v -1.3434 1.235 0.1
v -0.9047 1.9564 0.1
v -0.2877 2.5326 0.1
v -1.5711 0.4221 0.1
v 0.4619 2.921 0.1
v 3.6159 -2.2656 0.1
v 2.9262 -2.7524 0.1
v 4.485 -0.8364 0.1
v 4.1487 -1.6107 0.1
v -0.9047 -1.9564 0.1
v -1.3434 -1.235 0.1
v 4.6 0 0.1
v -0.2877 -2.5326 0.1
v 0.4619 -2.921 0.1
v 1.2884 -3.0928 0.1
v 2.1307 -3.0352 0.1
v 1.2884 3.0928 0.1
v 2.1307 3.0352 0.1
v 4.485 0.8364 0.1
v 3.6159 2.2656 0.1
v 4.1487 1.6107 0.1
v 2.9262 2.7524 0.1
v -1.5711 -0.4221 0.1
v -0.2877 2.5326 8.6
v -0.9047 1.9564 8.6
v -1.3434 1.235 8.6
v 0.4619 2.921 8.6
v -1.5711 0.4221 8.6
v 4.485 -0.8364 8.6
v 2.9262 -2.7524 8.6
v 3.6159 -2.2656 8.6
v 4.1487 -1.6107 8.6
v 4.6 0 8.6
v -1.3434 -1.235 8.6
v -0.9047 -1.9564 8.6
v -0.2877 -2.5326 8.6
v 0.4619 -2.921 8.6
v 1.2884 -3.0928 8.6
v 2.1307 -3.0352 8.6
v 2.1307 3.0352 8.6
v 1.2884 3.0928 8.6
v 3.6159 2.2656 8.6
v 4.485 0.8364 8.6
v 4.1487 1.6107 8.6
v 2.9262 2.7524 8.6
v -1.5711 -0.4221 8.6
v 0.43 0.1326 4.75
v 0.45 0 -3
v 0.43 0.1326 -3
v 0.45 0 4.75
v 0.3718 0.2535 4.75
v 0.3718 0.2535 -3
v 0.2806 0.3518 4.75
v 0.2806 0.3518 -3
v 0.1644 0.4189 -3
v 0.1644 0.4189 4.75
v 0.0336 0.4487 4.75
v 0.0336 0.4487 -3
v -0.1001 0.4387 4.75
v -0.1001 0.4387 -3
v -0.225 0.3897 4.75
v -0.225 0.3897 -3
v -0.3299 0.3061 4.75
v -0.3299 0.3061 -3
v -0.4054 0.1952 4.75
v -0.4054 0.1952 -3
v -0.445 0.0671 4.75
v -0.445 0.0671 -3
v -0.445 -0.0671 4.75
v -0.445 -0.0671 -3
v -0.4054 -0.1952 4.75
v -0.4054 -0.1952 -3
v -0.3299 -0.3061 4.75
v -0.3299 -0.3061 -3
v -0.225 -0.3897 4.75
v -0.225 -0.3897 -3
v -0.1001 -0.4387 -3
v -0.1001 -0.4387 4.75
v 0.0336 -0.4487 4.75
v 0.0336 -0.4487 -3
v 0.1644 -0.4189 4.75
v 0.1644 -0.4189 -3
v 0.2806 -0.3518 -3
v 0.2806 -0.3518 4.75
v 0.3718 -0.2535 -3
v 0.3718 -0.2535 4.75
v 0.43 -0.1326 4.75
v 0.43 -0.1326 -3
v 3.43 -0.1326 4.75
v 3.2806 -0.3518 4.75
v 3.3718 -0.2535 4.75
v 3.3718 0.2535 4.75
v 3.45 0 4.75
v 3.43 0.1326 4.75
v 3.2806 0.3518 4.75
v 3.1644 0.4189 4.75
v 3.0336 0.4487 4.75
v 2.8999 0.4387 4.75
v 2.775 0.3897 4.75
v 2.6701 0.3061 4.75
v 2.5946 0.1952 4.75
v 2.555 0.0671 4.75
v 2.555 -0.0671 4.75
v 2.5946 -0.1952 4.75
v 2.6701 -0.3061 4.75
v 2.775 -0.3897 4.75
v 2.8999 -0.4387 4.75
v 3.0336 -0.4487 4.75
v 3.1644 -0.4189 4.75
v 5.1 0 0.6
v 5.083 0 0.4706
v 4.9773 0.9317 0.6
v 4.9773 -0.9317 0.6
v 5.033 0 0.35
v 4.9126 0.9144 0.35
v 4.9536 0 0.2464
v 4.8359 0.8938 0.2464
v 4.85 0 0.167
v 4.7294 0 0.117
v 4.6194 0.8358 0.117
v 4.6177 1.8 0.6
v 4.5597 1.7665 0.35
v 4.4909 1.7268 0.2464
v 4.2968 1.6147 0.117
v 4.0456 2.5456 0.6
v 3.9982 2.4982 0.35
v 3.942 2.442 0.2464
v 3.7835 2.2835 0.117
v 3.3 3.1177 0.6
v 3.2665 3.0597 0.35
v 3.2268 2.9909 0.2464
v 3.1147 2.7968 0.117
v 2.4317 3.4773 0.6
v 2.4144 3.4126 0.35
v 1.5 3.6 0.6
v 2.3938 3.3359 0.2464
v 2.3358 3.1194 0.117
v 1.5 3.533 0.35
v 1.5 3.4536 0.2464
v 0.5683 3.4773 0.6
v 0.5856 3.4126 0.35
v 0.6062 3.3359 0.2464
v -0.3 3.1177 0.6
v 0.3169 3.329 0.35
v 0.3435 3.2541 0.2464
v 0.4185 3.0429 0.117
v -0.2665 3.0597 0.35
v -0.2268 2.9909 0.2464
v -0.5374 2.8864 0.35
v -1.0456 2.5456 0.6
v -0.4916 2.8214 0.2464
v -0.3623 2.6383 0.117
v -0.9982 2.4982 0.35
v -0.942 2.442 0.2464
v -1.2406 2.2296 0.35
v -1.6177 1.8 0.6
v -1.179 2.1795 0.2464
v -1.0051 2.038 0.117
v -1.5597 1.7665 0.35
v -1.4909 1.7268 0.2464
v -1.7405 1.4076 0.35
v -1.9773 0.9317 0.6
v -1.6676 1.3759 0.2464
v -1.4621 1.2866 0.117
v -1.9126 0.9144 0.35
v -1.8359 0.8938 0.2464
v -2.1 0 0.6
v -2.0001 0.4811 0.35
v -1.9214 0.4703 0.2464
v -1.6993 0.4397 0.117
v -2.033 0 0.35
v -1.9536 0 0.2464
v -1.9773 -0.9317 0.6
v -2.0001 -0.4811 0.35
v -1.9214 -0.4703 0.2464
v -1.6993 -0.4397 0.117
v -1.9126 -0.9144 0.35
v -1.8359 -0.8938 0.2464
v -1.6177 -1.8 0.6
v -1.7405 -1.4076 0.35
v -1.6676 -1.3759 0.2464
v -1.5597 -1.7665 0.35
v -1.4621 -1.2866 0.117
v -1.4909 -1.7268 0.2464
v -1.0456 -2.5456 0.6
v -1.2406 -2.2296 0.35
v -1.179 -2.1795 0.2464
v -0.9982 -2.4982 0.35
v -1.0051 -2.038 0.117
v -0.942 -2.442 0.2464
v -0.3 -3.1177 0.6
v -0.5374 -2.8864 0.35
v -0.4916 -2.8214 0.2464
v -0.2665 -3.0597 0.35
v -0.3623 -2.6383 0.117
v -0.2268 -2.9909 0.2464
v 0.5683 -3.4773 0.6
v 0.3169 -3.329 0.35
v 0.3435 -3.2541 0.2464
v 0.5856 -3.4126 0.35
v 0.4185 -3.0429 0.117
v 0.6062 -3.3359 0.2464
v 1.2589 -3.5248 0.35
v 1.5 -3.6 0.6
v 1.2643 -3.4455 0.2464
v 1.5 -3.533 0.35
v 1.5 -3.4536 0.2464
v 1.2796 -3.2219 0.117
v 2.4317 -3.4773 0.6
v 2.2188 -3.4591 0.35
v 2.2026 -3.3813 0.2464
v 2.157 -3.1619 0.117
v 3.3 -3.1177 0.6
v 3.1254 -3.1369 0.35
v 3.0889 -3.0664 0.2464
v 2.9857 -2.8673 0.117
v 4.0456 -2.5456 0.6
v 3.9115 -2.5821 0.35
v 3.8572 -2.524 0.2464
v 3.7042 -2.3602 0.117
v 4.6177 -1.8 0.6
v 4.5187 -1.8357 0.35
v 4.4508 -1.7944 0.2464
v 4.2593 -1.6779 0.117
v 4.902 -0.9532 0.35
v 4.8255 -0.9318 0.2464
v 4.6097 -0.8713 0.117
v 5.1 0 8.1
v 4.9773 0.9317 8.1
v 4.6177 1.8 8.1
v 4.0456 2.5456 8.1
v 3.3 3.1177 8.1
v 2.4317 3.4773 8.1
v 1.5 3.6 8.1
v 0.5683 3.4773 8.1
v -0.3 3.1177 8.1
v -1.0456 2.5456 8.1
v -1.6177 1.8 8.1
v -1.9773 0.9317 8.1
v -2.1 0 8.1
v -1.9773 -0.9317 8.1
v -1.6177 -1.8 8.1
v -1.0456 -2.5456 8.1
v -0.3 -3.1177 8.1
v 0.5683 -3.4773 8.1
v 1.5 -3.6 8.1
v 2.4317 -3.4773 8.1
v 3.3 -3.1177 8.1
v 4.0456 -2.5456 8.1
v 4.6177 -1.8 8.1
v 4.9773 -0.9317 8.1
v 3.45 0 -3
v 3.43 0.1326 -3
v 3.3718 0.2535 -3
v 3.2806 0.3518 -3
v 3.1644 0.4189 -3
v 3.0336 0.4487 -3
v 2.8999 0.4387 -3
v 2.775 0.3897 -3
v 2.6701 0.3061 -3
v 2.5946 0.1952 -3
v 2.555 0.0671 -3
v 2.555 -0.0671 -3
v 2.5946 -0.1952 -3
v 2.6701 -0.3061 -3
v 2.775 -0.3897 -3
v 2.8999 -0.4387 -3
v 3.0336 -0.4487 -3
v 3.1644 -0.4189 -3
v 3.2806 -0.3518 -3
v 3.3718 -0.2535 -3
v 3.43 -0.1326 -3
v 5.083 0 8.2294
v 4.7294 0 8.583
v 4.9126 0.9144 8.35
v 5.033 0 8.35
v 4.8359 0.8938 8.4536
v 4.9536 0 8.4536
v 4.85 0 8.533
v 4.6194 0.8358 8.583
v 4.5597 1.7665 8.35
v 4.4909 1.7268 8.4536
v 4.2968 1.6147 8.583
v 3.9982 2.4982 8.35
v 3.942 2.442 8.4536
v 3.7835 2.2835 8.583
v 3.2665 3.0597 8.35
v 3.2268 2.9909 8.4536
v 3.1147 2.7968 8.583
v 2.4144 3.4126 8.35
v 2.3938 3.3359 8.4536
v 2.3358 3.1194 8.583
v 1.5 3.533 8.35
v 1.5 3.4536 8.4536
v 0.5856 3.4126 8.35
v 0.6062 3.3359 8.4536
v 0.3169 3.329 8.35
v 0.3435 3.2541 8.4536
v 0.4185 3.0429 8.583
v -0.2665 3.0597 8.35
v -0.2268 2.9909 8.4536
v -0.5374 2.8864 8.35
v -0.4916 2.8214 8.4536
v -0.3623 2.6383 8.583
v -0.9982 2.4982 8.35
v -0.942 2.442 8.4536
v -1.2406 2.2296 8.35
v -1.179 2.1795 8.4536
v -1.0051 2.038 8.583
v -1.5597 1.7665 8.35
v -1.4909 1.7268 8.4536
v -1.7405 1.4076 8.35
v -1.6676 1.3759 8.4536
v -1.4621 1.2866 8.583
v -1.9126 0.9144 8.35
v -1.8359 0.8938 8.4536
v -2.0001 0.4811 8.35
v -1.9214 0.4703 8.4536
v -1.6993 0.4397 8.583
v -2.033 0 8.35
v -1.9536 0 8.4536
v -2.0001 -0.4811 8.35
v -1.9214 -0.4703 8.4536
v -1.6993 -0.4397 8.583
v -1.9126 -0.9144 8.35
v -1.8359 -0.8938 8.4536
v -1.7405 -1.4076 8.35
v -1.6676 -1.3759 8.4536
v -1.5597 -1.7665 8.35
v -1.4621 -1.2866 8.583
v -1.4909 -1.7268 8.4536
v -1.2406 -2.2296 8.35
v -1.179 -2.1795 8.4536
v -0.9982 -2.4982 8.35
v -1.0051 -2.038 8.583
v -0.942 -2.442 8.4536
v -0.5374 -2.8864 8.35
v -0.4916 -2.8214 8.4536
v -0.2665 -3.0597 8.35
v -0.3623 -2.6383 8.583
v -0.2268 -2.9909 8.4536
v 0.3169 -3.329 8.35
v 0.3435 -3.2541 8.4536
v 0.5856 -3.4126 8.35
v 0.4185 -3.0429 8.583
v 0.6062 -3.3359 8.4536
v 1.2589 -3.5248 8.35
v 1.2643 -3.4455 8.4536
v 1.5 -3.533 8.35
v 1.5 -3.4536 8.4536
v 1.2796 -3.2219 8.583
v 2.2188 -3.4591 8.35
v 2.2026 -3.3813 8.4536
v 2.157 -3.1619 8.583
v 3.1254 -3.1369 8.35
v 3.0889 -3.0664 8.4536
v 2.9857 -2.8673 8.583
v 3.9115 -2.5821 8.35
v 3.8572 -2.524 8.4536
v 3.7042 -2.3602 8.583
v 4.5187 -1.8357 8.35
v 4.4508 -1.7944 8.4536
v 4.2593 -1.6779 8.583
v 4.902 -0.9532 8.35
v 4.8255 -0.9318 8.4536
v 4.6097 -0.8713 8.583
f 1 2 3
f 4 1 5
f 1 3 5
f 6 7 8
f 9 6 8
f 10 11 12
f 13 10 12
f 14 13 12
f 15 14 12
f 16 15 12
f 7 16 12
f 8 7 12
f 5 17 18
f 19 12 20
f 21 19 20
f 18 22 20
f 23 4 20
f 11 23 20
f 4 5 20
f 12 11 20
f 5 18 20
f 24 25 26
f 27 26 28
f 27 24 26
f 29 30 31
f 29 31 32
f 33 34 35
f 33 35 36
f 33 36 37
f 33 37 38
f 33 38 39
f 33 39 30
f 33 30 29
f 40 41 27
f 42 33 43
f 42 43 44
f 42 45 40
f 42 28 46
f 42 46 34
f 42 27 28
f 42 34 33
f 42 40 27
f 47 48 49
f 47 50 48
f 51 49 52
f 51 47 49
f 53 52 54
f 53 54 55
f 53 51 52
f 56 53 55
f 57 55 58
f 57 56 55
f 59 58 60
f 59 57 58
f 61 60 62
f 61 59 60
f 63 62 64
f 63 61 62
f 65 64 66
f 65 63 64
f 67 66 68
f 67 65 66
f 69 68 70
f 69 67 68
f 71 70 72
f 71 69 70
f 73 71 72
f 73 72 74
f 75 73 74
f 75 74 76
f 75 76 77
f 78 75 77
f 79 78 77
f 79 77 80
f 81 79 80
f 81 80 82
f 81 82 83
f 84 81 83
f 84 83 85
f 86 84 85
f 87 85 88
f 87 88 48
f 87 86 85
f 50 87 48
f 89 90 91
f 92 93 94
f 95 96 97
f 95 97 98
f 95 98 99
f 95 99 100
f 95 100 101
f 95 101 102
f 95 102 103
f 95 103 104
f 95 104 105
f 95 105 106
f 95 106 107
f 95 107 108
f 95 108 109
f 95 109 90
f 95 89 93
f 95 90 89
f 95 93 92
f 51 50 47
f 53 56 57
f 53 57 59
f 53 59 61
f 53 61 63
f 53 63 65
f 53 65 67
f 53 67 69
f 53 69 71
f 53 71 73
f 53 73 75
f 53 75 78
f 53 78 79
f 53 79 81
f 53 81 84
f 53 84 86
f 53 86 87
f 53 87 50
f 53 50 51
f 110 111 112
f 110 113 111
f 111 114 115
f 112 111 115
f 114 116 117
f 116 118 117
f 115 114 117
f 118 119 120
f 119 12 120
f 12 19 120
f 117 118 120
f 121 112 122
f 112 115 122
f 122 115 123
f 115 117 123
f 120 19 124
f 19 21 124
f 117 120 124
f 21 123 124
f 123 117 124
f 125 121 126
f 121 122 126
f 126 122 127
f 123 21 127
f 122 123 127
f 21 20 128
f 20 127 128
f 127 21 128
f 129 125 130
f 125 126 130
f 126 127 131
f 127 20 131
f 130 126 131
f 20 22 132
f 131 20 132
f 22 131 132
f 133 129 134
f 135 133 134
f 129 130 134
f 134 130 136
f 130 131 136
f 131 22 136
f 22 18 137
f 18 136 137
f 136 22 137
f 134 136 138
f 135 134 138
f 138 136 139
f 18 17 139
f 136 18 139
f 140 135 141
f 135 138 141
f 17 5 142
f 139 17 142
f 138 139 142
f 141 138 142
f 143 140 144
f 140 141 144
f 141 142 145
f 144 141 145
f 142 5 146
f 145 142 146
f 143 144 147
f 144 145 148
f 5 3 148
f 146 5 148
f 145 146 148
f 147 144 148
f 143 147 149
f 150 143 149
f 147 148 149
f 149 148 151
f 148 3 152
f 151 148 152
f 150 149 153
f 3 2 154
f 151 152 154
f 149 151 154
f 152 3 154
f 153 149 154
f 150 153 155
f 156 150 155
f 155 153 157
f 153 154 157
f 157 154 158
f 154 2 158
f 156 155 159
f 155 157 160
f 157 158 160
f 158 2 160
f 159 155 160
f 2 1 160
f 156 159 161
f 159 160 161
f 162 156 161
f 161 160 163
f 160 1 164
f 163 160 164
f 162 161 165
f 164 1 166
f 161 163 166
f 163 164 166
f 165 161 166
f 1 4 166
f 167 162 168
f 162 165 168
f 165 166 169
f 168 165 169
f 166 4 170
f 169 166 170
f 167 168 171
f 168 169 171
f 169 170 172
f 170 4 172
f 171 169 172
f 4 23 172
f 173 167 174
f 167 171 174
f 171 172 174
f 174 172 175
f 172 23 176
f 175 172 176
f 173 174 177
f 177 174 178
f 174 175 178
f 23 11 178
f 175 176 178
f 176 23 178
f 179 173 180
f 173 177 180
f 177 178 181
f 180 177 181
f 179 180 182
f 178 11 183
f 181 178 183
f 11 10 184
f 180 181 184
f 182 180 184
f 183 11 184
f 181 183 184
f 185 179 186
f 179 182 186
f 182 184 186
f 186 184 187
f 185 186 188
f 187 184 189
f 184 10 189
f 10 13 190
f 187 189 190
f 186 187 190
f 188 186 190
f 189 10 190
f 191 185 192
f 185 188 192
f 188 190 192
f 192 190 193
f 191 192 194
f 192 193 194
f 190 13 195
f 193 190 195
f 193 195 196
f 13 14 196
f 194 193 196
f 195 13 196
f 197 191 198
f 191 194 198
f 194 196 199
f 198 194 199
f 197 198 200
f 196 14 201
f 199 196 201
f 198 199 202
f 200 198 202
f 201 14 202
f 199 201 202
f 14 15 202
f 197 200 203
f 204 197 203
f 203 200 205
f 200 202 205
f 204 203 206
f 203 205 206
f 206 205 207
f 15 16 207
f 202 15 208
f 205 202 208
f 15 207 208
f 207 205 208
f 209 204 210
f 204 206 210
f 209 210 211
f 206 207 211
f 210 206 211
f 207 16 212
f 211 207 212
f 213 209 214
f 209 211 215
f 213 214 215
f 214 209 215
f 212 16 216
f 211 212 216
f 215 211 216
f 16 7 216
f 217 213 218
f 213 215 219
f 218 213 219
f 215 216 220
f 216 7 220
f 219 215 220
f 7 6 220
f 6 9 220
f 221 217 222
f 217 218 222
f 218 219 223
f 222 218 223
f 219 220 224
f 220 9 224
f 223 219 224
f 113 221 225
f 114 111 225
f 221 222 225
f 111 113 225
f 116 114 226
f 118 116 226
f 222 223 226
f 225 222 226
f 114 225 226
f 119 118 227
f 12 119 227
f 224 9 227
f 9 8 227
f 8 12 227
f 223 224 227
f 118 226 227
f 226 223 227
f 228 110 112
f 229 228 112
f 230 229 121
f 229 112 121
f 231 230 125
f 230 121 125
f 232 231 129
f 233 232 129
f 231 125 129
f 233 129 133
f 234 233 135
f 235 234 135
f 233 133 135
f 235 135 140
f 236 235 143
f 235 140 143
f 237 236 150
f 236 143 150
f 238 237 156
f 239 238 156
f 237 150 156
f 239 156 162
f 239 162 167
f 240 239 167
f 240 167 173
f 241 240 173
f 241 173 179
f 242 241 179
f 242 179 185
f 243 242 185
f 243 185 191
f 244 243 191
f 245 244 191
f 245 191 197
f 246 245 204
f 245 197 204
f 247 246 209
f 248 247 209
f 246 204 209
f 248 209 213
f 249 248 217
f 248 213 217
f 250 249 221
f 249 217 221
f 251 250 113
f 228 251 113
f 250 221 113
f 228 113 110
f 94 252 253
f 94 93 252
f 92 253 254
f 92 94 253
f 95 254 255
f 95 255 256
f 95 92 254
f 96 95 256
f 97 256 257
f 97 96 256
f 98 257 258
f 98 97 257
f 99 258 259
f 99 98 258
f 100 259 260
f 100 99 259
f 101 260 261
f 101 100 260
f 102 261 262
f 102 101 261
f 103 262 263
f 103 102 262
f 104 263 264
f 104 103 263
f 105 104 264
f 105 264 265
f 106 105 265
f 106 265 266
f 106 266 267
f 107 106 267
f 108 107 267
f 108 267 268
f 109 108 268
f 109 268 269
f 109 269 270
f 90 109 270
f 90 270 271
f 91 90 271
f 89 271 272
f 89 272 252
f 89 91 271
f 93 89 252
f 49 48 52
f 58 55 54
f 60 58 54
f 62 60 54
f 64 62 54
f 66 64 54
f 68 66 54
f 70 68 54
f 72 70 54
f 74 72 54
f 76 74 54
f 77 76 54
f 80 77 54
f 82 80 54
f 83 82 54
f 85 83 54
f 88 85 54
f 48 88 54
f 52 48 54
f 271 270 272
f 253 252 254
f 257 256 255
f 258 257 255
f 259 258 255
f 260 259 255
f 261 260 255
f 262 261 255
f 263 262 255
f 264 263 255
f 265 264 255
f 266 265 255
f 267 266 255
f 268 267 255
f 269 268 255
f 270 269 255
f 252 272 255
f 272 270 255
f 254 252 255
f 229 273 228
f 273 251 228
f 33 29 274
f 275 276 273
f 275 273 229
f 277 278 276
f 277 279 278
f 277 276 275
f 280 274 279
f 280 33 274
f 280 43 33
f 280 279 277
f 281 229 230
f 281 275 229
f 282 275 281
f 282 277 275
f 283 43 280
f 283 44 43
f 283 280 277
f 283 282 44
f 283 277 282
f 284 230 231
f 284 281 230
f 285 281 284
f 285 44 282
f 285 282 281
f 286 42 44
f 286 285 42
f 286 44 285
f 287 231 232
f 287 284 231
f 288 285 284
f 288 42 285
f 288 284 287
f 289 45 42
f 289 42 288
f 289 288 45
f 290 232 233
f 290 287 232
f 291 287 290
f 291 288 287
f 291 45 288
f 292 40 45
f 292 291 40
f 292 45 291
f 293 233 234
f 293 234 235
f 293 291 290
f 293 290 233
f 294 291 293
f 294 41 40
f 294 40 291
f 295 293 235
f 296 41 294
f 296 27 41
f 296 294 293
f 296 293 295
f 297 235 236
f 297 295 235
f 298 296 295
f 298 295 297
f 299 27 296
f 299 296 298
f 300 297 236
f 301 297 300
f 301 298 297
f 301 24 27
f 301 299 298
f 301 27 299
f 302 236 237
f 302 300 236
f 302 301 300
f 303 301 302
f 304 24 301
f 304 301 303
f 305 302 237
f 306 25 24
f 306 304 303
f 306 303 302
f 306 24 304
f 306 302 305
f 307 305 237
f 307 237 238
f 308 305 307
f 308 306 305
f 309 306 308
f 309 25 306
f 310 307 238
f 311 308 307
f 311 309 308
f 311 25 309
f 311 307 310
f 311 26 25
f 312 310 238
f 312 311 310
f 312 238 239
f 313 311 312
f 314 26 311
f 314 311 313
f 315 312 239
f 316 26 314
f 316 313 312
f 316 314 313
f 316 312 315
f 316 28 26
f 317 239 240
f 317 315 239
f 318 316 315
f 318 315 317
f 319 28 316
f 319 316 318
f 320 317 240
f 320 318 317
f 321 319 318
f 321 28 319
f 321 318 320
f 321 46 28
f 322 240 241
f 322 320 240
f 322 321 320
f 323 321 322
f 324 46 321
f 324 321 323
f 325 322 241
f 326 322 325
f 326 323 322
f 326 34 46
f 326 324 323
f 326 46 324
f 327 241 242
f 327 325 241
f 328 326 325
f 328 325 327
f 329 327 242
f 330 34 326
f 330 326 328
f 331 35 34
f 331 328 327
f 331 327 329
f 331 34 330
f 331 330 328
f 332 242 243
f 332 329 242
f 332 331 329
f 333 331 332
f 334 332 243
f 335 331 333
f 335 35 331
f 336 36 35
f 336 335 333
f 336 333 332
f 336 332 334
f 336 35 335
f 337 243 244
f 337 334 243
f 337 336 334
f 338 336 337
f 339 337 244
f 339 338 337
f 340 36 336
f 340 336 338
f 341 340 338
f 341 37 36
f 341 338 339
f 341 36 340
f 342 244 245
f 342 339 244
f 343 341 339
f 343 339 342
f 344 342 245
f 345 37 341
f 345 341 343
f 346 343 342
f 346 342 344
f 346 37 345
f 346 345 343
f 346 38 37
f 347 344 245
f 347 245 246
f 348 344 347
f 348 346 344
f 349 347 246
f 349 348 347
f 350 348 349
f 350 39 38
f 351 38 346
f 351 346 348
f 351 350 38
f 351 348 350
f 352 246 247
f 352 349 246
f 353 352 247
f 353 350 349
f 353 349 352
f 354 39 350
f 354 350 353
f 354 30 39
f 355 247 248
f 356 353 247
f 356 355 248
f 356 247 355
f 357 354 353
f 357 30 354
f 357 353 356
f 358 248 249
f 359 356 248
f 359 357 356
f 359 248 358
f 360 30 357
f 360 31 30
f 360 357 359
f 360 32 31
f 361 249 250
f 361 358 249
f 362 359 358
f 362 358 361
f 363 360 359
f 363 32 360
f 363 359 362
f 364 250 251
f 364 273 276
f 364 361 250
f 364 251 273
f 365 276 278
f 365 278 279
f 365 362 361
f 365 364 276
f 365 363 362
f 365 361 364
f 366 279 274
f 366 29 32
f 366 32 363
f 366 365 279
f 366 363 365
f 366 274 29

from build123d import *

# Parameters (mm, degrees)
SKETCH001_R       = 0.45
PAD001_DEPTH      = 4.25
PAD001_DEPTH_BACK = 3.5
SKETCH_R          = 3.6
PAD_DEPTH         = 8.5
FILLET_R          = 0.5


with BuildPart() as pad001:
    # Sketch001 → Pad001 (new body, two sides)
    with BuildSketch(Plane.XY.offset(0.5)) as pad001_sk:
        Circle(SKETCH001_R)
        with Locations((3, 0)):
            Circle(SKETCH001_R)
    extrude(amount=PAD001_DEPTH)
    extrude(pad001_sk.sketch, amount=-PAD001_DEPTH_BACK)


with BuildPart() as fillet_body:
    # Sketch → Pad (new body)
    with BuildSketch(Plane.XY.offset(0.1)):
        with Locations((1.5, 0)):
            Circle(SKETCH_R)
    extrude(amount=PAD_DEPTH)

    # Fillet
    fillet_edges = [fillet_body.edges().sort_by_distance(p)[0] for p in [
        (-2.1, 0, 0.1),
        (-2.1, 0, 8.6),
    ]]
    fillet(fillet_edges, radius=FILLET_R)


solid = Compound([pad001.part, fillet_body.part])
